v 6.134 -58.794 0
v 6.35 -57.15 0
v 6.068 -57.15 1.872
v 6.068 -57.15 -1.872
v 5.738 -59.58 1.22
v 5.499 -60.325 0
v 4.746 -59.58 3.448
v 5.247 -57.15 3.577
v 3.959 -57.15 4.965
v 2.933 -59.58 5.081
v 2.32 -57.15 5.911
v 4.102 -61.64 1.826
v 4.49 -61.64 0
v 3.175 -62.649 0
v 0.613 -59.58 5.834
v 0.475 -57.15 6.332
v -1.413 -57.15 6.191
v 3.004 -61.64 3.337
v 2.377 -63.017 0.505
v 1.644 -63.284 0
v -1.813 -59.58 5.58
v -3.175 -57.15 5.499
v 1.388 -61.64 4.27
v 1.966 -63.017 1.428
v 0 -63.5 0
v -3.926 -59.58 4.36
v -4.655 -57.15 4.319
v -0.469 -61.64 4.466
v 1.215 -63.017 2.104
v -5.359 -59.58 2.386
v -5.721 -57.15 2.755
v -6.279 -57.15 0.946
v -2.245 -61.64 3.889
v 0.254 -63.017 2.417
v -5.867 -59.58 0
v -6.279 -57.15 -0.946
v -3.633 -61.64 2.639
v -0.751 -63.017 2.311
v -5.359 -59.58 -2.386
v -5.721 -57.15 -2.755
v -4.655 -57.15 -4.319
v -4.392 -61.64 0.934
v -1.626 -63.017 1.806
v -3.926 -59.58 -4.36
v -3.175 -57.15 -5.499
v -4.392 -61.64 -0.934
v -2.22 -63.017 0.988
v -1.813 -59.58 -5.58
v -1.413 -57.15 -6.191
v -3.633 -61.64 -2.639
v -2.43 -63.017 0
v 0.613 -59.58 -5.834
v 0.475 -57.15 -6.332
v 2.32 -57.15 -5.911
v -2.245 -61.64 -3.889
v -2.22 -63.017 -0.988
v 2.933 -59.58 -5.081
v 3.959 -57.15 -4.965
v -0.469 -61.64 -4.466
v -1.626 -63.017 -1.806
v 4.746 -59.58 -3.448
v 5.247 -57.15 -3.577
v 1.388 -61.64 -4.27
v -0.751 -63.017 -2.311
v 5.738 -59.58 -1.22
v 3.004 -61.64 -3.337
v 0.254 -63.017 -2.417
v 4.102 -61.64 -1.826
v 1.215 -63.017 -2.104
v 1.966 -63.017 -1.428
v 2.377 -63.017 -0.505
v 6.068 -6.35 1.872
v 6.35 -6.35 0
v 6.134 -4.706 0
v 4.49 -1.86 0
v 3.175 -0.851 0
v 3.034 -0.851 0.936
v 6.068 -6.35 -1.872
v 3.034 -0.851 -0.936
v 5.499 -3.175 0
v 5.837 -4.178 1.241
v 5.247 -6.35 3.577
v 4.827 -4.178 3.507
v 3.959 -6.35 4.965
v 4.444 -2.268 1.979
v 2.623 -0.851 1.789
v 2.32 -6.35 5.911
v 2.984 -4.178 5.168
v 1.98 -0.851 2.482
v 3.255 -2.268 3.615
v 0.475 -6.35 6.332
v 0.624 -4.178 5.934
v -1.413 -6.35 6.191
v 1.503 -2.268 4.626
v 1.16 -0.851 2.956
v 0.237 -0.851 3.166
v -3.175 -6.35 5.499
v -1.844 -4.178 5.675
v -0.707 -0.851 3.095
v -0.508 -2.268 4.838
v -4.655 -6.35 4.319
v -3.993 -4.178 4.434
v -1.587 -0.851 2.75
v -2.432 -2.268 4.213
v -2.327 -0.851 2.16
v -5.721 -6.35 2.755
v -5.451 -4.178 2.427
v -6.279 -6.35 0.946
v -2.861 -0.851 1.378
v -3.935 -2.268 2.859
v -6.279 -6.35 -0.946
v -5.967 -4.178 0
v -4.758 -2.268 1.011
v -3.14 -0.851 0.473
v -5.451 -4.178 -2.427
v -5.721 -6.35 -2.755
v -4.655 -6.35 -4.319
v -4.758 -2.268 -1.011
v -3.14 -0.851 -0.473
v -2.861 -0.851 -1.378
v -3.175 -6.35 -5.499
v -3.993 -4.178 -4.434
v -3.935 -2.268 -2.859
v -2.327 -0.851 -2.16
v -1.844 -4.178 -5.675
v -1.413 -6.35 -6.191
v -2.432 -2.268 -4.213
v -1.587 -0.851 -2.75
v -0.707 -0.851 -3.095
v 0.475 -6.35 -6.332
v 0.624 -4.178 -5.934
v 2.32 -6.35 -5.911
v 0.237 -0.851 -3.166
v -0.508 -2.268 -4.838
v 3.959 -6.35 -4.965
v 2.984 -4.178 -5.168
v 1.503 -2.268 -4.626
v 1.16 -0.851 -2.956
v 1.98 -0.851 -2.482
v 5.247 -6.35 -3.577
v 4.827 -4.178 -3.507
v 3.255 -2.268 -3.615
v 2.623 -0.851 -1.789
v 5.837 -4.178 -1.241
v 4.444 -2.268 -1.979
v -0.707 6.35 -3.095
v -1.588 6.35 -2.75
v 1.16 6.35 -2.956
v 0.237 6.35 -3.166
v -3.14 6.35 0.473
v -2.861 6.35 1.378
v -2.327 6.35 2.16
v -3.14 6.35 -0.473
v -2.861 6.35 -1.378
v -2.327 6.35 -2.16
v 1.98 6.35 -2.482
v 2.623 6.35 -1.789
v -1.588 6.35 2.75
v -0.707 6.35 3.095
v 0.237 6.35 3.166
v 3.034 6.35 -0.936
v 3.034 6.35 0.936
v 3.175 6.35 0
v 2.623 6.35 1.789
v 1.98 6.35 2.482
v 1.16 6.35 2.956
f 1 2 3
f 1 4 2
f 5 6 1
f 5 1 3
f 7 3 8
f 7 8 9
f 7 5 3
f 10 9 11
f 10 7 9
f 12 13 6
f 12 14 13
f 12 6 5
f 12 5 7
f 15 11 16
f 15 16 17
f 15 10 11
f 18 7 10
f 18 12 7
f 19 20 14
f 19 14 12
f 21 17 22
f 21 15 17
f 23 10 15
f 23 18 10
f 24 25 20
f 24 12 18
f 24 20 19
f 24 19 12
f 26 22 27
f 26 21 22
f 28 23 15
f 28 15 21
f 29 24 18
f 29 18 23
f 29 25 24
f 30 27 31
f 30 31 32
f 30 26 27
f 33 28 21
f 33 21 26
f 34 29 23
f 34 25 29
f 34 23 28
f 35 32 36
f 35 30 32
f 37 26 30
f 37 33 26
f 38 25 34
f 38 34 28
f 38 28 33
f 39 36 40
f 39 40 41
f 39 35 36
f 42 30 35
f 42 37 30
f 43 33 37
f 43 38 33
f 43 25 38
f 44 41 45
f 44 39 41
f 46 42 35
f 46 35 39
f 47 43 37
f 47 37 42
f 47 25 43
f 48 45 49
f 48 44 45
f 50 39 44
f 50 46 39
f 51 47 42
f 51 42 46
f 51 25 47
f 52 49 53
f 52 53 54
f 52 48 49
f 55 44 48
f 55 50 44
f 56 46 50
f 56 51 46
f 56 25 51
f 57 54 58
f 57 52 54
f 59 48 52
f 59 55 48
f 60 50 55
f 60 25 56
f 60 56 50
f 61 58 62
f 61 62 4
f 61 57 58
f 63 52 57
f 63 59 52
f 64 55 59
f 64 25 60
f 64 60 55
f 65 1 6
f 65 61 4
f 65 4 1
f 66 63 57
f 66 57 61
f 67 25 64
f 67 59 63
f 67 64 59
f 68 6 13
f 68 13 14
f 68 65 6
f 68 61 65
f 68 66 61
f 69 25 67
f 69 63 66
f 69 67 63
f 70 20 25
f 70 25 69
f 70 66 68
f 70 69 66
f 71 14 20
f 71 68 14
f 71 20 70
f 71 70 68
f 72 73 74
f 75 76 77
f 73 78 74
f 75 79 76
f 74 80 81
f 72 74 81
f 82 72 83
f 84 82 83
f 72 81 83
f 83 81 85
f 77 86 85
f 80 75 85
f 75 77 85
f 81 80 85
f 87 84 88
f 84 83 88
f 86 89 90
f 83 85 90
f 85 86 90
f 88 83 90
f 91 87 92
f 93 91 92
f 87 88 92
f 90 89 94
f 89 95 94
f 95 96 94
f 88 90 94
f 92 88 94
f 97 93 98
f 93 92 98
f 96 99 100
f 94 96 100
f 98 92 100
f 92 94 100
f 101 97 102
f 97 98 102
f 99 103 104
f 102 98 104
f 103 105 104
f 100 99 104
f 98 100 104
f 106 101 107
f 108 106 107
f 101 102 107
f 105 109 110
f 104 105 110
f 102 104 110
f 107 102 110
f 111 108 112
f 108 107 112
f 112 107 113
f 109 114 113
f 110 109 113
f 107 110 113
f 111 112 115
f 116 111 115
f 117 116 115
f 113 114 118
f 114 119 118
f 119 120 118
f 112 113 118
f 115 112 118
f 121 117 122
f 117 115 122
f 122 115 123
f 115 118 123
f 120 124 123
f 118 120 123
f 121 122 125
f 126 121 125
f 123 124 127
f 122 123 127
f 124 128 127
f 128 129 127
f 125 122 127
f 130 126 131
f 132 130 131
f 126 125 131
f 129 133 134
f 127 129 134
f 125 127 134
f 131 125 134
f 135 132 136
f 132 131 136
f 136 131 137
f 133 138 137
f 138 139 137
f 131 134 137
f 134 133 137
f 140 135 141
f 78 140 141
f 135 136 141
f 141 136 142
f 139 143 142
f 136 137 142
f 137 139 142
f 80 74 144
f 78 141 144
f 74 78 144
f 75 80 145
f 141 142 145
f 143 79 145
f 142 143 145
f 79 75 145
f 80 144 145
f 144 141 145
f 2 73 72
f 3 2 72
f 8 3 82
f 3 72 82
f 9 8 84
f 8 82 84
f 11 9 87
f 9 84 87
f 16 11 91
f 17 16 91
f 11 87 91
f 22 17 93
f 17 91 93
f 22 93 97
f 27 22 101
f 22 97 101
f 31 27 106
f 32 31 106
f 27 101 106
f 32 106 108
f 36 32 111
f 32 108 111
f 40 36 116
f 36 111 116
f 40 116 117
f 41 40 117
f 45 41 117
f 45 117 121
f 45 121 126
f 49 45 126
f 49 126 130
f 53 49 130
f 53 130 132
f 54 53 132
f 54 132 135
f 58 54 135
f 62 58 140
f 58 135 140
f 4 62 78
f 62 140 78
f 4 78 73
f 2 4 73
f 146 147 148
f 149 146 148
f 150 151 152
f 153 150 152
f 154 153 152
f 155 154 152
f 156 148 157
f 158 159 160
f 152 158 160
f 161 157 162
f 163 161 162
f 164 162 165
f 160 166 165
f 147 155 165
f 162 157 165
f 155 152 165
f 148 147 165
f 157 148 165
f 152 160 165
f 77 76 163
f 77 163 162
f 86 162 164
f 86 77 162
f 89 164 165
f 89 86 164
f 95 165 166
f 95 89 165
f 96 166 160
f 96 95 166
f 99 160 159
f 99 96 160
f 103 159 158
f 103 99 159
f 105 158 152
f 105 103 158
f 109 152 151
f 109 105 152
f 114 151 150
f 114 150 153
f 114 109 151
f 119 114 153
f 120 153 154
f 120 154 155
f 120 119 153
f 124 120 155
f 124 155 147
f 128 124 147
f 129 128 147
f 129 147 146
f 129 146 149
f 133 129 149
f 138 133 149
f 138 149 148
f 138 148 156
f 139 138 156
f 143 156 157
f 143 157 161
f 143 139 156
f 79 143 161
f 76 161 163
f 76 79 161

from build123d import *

# Parameters (mm, degrees)
F0_R     = 6.35
F1_DEPTH = 63.5
F2_R     = 6.35
F3_R     = 3.175
F4_DEPTH = 6.35


with BuildPart() as f1:
    # F0 (on Front) → F1 (new body)
    with BuildSketch(Plane.XZ):
        Circle(F0_R)
    extrude(amount=F1_DEPTH)

    # F2
    f2_edges = [f1.edges().sort_by_distance(p)[0] for p in [
        (-6.35, -63.5, 0),
        (-6.35, 0, 0),
    ]]
    fillet(f2_edges, radius=F2_R)

    # F3 (on Front) → F4 (join, symmetric)
    with BuildSketch(Plane.XZ):
        Circle(F3_R)
    extrude(amount=F4_DEPTH, both=True)


solid = f1.part
